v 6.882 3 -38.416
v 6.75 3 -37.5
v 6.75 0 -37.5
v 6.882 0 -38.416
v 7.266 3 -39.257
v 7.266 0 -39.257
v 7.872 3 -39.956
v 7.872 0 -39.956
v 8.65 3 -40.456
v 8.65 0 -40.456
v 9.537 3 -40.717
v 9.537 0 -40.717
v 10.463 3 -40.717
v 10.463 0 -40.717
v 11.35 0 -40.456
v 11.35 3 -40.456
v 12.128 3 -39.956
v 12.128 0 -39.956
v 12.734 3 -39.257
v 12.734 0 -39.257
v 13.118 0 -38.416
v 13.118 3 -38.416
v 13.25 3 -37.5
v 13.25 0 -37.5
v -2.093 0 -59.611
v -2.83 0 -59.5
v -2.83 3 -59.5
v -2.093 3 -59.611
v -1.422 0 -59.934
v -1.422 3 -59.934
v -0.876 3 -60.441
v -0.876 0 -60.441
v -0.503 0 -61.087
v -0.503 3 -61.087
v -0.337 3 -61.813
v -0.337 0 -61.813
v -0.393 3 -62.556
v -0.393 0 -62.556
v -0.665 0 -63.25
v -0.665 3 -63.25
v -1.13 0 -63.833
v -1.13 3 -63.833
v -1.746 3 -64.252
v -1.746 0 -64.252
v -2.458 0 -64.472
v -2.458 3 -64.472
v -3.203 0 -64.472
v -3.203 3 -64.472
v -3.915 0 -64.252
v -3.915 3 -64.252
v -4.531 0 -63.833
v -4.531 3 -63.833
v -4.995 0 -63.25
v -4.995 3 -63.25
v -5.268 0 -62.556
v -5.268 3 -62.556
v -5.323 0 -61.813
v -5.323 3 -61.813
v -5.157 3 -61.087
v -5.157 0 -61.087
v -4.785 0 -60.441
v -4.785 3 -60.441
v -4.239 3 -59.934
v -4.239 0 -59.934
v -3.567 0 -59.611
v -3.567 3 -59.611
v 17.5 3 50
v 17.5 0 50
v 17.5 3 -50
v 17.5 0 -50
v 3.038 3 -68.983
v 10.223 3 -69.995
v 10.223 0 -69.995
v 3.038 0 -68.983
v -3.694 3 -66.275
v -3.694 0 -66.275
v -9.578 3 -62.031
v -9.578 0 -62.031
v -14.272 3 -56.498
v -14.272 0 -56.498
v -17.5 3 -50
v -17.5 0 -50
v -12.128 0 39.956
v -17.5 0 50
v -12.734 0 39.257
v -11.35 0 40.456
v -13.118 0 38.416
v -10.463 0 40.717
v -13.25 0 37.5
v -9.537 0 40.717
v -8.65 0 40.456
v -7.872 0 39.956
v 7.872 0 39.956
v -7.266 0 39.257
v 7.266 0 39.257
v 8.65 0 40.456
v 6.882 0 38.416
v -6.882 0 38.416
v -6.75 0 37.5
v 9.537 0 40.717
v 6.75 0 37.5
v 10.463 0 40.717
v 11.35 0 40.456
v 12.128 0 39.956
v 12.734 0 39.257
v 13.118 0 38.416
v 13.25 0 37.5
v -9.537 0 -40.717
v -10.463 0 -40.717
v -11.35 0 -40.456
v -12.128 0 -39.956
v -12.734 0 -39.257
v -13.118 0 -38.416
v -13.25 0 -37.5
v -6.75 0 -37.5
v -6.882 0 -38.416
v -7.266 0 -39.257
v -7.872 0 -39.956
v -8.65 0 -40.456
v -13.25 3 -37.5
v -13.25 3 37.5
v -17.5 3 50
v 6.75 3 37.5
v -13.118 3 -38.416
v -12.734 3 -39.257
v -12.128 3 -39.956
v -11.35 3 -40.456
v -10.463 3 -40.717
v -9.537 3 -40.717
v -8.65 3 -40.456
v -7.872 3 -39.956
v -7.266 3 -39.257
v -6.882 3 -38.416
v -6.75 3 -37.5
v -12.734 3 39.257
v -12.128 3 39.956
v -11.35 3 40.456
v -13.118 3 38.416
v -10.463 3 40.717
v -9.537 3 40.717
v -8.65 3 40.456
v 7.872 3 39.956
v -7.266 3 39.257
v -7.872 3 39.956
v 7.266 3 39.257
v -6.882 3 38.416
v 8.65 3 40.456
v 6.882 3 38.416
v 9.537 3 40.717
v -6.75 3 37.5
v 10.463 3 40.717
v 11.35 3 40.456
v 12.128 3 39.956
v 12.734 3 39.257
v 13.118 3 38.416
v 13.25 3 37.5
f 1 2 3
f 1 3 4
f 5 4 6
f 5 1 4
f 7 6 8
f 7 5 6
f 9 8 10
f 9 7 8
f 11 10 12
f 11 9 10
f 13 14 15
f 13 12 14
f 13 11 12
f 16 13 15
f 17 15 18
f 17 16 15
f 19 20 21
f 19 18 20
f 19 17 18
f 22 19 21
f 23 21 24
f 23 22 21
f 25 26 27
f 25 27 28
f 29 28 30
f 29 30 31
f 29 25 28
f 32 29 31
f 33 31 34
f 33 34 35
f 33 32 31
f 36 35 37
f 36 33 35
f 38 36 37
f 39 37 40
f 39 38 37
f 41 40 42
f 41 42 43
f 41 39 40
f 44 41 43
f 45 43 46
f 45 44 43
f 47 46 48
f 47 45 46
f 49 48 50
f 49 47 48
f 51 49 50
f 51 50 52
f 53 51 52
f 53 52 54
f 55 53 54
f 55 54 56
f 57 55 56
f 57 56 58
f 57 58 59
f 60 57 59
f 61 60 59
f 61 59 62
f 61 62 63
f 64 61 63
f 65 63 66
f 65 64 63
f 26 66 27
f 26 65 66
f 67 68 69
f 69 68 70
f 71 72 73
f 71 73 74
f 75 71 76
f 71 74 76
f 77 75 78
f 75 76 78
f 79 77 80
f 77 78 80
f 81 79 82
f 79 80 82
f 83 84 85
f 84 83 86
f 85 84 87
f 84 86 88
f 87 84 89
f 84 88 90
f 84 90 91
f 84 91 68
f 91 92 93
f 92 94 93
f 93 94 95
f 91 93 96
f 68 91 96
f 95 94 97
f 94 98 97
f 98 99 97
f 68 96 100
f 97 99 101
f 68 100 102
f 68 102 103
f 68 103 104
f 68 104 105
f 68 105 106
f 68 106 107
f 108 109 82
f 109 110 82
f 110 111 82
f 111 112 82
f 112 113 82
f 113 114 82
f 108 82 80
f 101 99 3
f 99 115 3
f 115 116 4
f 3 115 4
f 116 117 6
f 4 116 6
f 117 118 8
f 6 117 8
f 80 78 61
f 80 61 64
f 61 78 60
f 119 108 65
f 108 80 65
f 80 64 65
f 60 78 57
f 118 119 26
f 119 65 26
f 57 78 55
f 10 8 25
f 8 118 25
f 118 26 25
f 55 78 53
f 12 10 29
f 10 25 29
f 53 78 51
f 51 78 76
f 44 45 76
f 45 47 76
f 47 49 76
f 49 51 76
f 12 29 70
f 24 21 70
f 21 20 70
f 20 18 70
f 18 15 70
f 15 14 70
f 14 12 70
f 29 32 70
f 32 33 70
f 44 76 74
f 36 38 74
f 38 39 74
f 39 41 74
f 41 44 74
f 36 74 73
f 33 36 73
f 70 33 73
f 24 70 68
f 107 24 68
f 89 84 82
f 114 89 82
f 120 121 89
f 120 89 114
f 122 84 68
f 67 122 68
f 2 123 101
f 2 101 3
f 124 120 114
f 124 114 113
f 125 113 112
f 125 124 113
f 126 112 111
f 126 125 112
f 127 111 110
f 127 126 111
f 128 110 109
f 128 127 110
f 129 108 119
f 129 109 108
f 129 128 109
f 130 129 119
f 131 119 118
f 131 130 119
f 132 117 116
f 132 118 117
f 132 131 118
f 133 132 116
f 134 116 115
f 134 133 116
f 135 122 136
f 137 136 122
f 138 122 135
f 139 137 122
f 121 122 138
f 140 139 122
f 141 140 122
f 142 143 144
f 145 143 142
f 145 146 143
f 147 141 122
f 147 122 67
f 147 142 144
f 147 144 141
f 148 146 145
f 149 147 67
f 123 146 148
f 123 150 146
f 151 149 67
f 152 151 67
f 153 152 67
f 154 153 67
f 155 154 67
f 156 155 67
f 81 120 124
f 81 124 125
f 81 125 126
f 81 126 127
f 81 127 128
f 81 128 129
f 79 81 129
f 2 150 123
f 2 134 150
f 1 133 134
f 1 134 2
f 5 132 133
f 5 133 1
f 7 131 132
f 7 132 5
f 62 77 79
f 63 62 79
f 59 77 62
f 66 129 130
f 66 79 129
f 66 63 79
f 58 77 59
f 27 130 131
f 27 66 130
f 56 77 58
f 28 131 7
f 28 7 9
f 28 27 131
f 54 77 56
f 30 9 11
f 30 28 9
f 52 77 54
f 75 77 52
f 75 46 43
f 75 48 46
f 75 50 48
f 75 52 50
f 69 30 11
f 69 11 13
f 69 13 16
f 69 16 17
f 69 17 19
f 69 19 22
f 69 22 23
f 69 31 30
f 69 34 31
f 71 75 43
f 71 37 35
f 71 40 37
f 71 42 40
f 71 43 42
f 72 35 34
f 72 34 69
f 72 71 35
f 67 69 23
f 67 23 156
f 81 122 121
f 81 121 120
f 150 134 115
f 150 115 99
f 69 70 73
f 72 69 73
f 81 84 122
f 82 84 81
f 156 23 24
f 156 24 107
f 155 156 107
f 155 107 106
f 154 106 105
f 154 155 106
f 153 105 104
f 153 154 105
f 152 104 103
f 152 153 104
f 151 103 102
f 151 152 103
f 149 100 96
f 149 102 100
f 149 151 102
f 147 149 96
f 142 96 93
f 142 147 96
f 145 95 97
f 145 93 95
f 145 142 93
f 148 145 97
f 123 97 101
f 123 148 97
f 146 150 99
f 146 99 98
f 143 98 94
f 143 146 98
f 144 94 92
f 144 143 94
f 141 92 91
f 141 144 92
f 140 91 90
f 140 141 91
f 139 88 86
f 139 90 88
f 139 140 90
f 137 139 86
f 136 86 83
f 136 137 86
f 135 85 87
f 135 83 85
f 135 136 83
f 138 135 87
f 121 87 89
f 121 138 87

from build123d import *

# Parameters (mm, degrees)
SKETCH1_W           = 35
SKETCH1_H           = 100
SKETCH1_R           = 2.5
BOSS_EXTRUDE1_DEPTH = 3
CUT_EXTRUDE2_DEPTH  = 75.317016198
FILLET1_R           = 30


with BuildPart() as part:
    # Sketch1 → Boss-Extrude1 (new body)
    # profile 1 of 2: a face of its own
    with BuildSketch(Plane(origin=(0, 0, 0), x_dir=(1, 0, 0), z_dir=(0, 1, 0))):
        Rectangle(SKETCH1_W, SKETCH1_H)
    # profile 2 of 2: a face of its own
    with BuildSketch(Plane(origin=(0, 0, 0), x_dir=(1, 0, 0), z_dir=(0, 1, 0))):
        Polygon((17.5, 50), (10.220595315, 70), (-24.779404685, 70), (-17.5, 50), align=None)
        with Locations(Location((-2.830309398, 62, 0), (0, 0, 270))):
            Circle(SKETCH1_R, mode=Mode.SUBTRACT)
    extrude(amount=BOSS_EXTRUDE1_DEPTH)

    # Sketch3 → Cut-Extrude2 (cut, through all)
    with BuildSketch(Plane(origin=(0, 3, 0), x_dir=(1, 0, 0), z_dir=(0, 1, 0))):
        with BuildLine():
            Line((-13.25, -37.5), (-13.25, 37.5))
            ThreePointArc((-13.25, 37.5), (-10, 40.75), (-6.75, 37.5))
            Line((-6.75, 37.5), (-6.75, -37.5))
            ThreePointArc((-6.75, -37.5), (-10, -40.75), (-13.25, -37.5))
        make_face()
        with BuildLine():
            Line((6.75, -37.5), (6.75, 37.5))
            ThreePointArc((6.75, 37.5), (10, 40.75), (13.25, 37.5))
            Line((13.25, 37.5), (13.25, -37.5))
            ThreePointArc((13.25, -37.5), (10, -40.75), (6.75, -37.5))
        make_face()
    extrude(amount=-CUT_EXTRUDE2_DEPTH, mode=Mode.SUBTRACT)

    # Fillet1
    # the kernel refuses this fillet: 30 mm, written as the material it takes off along each edge
    with BuildSketch(Plane(origin=(-24.779404685, -88.909189832, -70), x_dir=(1, 0, 0), z_dir=(0, 1, 0))) as fillet1_piece_1:
        with BuildLine():
            CenterArc((35.563675933, -30), FILLET1_R, 90, 70.528779366)
            Line((7.279404685, -20), (0, 0))
            Line((0, 0), (35.563675933, 0))
        make_face()
    extrude(amount=180.818379664, mode=Mode.SUBTRACT)


solid = part.part
